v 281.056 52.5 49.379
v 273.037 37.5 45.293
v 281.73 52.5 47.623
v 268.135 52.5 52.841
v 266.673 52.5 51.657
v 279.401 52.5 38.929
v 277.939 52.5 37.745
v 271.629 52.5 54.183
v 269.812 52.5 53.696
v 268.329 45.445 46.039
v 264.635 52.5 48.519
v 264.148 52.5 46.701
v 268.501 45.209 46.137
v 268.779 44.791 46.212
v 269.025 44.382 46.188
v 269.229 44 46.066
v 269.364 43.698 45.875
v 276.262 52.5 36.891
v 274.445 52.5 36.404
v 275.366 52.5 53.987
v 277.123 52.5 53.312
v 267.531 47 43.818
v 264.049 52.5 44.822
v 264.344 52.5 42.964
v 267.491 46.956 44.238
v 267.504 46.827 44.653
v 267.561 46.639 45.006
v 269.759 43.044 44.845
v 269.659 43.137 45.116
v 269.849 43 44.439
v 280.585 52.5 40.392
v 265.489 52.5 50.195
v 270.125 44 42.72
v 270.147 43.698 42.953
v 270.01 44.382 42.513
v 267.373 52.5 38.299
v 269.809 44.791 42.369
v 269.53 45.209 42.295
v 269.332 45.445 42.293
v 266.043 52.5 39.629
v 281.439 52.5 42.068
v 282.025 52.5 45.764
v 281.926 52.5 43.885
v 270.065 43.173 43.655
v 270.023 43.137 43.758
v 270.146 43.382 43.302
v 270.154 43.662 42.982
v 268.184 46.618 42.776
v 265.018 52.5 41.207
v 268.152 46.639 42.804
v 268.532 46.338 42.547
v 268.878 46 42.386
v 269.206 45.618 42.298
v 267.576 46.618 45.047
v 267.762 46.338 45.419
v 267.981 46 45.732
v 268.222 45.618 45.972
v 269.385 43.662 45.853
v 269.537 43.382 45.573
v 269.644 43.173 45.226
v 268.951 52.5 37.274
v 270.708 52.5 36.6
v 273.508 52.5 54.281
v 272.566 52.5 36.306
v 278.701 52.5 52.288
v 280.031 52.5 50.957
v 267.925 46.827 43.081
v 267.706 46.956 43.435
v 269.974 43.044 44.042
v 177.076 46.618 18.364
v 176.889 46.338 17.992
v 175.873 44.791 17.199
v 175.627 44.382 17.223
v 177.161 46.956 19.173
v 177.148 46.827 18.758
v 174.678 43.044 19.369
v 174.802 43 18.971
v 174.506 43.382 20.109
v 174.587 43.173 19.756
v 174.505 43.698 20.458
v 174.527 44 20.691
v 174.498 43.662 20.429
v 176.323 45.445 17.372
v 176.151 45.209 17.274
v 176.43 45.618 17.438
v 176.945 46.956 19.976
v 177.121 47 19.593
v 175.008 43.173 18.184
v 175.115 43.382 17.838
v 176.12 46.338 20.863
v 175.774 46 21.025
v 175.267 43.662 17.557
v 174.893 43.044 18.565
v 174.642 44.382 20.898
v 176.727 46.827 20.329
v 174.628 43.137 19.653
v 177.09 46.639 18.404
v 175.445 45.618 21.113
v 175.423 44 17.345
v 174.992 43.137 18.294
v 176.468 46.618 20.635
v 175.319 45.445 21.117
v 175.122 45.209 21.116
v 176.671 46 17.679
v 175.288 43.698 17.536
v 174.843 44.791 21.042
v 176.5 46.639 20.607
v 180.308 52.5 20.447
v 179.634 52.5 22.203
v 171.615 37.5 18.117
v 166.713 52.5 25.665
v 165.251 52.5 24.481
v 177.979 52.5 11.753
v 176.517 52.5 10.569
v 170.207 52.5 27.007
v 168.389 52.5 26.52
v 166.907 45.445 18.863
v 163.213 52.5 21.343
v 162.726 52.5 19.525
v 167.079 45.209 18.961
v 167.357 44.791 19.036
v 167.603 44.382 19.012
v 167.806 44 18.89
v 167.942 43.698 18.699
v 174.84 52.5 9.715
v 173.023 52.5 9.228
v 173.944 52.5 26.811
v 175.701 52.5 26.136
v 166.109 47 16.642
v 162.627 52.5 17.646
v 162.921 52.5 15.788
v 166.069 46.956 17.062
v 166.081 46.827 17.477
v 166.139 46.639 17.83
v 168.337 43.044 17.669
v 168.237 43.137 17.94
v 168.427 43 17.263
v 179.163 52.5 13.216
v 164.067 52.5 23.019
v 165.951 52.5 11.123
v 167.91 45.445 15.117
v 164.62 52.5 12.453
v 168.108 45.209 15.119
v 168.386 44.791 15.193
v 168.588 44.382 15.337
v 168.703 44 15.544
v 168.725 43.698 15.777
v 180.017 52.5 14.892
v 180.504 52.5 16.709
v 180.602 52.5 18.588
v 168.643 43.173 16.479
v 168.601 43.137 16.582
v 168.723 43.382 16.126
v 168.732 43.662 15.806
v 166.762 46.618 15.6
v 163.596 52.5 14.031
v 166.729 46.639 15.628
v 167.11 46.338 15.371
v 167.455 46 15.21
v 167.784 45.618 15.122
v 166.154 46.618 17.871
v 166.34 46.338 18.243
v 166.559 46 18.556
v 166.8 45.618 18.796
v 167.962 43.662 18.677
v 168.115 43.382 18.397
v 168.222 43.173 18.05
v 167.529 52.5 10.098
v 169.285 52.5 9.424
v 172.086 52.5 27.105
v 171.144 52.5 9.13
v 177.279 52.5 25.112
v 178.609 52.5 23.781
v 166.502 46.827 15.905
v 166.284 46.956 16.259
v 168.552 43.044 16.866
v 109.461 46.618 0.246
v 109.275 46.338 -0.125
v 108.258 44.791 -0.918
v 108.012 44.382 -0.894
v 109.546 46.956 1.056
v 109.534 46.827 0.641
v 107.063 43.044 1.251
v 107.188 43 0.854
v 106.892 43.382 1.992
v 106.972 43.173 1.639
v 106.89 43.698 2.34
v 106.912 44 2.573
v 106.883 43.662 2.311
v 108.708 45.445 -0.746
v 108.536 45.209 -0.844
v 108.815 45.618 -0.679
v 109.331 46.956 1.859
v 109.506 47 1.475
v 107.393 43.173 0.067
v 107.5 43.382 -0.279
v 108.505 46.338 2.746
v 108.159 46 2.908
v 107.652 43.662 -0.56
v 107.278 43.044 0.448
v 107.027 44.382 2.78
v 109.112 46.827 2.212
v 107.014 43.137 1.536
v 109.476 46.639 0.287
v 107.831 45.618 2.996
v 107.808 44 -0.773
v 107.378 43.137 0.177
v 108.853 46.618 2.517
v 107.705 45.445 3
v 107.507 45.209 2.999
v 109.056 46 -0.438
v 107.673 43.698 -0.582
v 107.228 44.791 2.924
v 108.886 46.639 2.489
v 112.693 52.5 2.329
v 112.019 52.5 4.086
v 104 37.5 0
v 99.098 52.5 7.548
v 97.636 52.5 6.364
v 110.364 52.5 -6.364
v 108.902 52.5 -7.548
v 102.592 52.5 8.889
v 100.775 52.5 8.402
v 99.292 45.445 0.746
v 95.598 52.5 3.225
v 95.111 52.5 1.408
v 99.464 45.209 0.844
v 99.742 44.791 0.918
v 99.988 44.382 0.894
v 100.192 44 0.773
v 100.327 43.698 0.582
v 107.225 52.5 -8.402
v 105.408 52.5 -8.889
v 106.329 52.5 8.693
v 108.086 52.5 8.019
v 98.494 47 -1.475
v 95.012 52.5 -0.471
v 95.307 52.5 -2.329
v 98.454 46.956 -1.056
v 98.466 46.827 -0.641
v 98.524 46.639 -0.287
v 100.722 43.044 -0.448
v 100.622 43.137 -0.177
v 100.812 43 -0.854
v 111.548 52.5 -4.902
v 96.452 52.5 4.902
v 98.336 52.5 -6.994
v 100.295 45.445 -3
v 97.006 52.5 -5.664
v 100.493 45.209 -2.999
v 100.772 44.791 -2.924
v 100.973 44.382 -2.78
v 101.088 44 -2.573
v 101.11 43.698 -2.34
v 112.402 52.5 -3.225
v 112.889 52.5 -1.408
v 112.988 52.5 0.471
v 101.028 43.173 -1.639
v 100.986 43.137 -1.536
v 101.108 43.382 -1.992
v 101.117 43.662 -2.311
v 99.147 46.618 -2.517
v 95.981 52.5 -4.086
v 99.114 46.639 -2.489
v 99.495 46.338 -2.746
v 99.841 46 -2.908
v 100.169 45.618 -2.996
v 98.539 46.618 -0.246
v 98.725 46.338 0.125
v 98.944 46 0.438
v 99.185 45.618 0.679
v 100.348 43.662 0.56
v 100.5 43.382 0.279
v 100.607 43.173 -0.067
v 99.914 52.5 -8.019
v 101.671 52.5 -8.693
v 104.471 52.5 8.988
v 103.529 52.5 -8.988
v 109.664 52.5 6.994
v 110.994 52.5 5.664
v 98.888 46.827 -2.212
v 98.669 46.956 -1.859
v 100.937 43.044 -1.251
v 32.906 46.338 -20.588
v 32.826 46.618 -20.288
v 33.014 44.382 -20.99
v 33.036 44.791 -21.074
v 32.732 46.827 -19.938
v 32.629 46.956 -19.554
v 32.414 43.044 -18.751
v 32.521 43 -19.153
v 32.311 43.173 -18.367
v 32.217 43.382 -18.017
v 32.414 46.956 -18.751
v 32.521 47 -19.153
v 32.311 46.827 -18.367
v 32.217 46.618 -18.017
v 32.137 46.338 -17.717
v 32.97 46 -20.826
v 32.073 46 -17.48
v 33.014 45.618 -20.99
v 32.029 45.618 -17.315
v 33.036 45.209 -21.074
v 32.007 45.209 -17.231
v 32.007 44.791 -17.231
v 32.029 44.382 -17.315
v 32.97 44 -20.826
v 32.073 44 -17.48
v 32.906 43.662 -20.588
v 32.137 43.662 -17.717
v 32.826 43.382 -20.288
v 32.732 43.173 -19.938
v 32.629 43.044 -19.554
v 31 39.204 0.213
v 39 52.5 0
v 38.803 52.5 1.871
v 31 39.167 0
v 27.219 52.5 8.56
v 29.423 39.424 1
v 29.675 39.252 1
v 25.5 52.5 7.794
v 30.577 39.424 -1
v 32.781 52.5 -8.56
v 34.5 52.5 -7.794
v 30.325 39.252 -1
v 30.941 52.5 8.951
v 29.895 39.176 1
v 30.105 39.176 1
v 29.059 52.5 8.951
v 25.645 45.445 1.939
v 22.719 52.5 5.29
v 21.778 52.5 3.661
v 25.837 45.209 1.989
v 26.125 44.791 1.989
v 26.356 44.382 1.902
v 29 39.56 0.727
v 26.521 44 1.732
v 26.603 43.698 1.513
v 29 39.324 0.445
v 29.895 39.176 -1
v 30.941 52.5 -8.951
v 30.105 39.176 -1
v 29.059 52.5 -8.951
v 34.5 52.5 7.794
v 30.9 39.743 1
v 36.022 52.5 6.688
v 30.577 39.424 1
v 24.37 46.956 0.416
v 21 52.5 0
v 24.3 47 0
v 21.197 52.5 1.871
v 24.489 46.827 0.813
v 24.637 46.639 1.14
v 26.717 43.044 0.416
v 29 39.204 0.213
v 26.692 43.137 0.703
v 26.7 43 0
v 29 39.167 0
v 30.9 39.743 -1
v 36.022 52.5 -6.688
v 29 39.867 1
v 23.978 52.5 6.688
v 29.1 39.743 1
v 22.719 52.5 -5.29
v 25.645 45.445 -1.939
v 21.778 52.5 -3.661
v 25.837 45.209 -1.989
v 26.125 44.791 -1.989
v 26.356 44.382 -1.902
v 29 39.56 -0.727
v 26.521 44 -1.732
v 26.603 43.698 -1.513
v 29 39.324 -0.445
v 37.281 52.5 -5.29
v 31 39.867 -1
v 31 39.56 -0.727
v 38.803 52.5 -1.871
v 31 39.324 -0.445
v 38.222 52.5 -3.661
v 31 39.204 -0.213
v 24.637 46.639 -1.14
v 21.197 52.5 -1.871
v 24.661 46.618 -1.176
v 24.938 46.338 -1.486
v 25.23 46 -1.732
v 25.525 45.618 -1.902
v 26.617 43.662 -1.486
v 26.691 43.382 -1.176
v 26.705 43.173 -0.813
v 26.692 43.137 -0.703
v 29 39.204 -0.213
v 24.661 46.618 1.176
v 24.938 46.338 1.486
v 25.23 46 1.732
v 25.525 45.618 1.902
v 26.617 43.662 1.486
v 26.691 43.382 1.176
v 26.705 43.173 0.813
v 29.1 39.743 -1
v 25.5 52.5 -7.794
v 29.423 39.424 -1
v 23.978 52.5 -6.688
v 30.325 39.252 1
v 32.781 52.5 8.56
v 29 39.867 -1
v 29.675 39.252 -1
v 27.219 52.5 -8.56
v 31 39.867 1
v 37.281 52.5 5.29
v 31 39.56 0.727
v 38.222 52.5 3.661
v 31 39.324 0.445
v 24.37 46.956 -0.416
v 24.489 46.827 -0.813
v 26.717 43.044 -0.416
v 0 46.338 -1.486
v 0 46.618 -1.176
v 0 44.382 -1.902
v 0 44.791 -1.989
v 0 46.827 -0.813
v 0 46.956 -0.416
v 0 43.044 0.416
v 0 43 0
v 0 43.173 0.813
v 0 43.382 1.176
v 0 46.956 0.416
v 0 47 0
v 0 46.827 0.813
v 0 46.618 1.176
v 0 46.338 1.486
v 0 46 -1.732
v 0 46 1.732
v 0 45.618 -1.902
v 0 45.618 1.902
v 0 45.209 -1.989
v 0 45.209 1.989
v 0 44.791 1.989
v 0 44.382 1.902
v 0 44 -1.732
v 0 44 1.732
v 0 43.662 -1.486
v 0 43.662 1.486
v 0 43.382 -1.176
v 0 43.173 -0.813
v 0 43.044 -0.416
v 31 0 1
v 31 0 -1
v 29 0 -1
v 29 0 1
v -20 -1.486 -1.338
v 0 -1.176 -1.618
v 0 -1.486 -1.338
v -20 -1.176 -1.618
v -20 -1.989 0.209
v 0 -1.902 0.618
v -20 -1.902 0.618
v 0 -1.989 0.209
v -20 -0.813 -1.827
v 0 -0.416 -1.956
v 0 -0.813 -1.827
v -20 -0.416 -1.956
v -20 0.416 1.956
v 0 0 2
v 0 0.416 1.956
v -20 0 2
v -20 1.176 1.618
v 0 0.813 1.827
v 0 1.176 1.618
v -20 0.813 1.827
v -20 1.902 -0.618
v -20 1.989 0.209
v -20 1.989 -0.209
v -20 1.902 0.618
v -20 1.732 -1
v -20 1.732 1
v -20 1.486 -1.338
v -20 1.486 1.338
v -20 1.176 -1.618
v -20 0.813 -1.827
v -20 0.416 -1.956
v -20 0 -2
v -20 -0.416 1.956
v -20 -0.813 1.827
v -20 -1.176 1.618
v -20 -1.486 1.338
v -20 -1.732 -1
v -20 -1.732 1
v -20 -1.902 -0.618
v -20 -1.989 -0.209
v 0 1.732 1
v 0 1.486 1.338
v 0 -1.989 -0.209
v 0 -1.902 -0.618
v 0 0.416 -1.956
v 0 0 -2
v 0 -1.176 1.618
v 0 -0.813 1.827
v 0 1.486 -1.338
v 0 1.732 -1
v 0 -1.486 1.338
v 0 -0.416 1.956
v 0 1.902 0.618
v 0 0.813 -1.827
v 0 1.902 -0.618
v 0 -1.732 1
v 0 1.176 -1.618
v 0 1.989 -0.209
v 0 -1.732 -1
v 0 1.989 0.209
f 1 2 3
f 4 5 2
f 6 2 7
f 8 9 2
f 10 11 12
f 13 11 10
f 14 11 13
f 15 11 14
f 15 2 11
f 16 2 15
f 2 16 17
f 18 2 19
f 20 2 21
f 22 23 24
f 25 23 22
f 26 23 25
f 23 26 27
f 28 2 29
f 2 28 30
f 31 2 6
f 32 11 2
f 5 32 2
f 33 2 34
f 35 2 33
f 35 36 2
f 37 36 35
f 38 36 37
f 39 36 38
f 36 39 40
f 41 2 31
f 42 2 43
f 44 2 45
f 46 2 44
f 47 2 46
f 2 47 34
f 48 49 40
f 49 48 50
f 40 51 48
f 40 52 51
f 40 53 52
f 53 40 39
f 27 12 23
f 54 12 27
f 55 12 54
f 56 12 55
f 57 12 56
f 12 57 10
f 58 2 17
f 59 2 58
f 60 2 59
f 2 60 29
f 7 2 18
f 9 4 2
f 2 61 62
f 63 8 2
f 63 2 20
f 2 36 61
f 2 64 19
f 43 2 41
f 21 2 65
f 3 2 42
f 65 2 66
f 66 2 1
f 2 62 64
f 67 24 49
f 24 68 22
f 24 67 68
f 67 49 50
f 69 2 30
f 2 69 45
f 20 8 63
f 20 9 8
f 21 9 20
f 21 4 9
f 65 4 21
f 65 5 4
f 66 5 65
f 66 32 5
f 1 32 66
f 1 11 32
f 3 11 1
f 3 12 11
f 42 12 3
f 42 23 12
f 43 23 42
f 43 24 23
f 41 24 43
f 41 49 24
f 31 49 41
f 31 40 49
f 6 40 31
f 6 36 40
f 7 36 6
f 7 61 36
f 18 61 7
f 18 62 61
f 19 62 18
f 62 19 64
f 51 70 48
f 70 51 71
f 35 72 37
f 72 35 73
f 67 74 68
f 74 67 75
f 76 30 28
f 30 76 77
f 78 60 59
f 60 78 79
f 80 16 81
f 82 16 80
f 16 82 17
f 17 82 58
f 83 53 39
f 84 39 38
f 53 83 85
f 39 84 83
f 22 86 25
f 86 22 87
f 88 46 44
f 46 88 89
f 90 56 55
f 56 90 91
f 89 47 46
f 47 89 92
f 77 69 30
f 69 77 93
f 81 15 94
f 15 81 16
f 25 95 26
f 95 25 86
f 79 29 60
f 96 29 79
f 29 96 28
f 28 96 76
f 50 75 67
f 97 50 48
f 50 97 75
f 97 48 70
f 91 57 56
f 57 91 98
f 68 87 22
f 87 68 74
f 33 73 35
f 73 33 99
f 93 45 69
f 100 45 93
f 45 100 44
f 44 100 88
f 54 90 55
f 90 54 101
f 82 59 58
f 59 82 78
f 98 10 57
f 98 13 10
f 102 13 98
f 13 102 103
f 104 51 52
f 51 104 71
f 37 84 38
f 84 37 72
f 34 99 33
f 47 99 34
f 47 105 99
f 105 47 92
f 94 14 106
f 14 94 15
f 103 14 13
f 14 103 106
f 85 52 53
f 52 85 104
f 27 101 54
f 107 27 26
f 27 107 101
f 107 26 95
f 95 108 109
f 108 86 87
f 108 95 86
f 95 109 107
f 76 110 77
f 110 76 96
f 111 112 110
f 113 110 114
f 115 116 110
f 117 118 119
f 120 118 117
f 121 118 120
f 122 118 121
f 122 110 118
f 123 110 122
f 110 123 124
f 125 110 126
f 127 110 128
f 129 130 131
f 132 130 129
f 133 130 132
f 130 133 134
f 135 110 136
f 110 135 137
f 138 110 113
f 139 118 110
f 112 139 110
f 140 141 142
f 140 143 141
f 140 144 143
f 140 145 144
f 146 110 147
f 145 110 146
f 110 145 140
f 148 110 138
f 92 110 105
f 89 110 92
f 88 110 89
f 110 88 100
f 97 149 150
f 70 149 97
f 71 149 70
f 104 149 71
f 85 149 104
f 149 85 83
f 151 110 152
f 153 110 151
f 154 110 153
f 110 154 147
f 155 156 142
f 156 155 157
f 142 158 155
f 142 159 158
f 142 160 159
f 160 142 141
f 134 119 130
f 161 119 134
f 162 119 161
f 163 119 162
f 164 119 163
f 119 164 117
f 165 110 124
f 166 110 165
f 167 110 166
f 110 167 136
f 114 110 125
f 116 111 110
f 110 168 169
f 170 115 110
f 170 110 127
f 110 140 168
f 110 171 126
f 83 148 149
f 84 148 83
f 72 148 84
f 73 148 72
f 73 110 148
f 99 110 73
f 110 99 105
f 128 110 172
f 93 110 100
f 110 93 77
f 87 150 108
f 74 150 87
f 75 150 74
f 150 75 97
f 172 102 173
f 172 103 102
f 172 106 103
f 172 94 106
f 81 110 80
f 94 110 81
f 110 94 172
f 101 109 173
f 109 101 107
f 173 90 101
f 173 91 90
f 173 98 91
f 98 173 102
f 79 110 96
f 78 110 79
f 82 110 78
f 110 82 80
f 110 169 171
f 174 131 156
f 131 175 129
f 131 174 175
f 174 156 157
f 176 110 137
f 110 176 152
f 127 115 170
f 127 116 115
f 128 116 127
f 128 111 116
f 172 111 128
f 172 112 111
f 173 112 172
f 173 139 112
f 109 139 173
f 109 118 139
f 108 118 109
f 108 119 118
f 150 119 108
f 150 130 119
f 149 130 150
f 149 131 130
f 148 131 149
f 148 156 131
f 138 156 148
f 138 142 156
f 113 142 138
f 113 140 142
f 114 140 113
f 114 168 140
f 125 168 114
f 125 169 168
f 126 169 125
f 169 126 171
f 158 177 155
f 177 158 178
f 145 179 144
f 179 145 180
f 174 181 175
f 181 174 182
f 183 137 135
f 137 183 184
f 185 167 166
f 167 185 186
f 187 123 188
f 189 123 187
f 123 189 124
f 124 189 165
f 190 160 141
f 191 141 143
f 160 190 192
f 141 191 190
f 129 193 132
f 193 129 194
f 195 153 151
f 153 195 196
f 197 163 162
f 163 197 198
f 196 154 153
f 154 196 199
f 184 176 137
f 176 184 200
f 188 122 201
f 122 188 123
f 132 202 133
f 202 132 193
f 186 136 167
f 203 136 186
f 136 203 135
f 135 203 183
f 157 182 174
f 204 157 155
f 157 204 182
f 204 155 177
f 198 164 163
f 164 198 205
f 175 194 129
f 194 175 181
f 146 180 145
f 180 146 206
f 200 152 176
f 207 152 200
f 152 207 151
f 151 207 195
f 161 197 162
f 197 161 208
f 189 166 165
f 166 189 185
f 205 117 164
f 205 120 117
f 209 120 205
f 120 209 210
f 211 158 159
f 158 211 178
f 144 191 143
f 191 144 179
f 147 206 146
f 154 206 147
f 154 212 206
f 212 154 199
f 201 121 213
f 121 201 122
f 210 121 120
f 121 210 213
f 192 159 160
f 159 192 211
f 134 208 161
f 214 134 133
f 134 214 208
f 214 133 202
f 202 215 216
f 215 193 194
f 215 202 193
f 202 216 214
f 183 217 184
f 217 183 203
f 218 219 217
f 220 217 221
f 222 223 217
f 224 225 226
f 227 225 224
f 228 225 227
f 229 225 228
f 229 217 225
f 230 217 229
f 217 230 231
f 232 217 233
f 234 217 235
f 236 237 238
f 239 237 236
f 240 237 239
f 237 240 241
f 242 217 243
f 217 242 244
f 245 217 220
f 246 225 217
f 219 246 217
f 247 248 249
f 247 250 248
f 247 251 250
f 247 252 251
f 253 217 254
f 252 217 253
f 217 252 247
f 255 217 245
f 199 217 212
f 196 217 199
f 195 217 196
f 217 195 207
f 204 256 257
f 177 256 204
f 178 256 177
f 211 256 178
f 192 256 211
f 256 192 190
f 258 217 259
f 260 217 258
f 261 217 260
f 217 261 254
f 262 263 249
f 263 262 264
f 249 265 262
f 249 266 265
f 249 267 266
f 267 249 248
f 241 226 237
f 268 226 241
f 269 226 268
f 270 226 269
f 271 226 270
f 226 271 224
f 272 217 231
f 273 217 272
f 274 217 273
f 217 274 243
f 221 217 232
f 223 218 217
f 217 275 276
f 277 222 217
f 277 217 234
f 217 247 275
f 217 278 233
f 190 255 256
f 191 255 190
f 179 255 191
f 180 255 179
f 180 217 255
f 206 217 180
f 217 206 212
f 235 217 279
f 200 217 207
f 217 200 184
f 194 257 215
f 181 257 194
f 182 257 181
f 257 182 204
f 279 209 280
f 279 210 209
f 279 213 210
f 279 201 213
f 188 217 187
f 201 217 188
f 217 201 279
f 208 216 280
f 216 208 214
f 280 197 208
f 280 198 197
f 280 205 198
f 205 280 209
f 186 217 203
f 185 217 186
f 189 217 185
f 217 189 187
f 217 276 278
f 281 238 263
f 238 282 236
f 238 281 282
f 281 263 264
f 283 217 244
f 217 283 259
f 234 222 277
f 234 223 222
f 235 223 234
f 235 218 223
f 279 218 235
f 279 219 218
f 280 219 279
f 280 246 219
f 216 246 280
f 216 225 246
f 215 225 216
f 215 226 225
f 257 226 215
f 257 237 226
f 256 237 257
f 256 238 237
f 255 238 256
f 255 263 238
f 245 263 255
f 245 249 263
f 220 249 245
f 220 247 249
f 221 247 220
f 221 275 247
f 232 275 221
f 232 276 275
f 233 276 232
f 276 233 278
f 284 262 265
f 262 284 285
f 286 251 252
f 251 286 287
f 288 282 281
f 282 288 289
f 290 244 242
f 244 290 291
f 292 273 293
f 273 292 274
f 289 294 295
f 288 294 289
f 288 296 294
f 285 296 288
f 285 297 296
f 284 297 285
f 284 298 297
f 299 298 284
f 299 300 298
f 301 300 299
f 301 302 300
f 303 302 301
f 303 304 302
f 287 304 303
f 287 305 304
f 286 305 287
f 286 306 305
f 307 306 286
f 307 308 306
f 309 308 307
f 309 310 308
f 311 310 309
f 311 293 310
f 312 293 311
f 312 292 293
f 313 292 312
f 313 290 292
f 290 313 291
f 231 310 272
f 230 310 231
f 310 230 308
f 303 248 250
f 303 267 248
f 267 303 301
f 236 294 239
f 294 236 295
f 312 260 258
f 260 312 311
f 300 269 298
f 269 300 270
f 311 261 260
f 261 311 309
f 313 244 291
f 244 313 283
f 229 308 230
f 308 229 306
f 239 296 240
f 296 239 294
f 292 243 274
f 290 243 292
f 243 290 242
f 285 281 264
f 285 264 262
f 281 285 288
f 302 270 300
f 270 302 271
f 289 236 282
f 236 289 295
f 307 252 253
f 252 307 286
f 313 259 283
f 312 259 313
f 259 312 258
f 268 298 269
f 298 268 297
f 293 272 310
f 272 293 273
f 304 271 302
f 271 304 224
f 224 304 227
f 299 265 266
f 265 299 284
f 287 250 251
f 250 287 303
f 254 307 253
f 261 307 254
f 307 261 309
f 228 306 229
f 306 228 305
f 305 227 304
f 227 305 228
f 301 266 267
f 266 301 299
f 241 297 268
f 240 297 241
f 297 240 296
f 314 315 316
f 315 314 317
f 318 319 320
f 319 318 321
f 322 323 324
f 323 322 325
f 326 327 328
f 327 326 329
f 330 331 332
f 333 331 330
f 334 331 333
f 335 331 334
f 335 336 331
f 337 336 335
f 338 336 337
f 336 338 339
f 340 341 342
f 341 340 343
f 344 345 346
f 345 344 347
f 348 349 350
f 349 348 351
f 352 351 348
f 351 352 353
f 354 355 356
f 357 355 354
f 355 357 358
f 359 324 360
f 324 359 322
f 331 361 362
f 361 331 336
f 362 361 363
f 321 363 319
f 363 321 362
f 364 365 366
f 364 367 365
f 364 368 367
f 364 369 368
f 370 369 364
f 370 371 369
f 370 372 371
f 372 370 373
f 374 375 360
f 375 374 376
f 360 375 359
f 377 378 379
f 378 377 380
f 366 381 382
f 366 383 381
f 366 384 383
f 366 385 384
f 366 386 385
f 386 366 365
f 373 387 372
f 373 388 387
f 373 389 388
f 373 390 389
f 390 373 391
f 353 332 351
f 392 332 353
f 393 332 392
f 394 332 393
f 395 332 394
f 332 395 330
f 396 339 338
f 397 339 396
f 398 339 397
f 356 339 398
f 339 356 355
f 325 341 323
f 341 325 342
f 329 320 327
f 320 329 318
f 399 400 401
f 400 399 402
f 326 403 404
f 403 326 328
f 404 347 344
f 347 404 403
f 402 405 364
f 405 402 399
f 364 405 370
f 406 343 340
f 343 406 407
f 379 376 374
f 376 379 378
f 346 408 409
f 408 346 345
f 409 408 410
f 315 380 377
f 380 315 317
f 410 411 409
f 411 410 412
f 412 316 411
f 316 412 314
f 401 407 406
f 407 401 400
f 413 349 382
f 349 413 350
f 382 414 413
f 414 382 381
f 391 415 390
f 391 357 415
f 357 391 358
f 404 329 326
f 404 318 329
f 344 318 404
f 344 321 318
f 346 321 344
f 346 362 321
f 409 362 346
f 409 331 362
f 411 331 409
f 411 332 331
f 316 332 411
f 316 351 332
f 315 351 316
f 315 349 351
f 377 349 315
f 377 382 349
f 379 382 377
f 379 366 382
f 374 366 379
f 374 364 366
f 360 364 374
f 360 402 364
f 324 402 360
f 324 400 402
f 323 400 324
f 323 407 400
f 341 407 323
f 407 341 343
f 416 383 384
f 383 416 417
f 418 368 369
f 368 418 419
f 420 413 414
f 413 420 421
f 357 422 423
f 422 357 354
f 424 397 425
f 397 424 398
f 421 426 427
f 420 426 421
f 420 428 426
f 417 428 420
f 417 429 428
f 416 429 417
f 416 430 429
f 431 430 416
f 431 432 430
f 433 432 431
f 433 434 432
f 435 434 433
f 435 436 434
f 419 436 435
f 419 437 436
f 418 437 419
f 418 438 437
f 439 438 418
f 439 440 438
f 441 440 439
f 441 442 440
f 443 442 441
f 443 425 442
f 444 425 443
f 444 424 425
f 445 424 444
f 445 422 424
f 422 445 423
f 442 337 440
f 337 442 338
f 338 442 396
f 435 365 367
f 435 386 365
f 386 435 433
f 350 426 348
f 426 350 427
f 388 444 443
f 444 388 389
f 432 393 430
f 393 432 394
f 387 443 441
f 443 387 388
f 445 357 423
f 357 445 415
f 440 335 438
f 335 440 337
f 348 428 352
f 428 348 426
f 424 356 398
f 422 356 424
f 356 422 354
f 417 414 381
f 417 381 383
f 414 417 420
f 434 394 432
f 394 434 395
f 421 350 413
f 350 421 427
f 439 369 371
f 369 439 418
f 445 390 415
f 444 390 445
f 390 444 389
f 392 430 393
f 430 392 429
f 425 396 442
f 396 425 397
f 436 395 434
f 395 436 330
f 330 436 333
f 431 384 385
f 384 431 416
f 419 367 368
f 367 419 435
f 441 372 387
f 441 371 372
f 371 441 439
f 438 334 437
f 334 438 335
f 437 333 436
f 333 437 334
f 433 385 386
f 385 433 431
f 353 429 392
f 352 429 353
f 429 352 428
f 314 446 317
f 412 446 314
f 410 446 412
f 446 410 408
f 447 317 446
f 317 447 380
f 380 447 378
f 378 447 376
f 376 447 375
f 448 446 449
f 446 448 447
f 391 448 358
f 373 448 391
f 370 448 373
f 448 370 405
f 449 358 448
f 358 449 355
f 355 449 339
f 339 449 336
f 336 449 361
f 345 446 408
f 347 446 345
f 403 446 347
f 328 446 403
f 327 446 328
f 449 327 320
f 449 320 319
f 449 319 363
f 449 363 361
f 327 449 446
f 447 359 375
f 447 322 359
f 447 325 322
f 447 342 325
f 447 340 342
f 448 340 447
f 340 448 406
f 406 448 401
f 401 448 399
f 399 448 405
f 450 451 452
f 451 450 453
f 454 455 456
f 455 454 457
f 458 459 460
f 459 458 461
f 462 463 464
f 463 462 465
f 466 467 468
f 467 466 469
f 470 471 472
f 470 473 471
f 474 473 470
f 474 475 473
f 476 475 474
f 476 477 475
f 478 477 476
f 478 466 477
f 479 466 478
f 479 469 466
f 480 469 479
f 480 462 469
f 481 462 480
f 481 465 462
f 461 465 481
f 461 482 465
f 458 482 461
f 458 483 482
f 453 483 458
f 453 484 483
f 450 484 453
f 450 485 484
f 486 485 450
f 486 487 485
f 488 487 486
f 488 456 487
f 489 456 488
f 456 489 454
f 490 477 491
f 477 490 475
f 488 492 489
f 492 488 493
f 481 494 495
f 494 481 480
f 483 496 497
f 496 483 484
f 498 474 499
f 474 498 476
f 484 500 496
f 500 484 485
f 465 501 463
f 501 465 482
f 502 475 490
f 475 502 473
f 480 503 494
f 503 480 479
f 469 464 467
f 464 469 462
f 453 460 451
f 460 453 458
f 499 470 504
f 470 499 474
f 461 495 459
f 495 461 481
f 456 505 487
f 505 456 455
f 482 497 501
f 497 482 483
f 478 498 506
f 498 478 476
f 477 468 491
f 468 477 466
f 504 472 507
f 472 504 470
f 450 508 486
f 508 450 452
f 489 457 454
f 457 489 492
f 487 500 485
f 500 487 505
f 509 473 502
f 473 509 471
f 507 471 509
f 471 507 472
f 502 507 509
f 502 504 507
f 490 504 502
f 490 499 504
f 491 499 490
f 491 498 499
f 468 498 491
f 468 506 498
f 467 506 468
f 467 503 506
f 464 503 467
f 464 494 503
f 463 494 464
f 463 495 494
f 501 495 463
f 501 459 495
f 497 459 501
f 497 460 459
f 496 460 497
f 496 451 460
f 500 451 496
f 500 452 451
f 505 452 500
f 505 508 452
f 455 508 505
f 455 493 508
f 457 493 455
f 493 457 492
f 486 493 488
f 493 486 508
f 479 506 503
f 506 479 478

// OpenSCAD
resolution = 30;

jr = 9;
jh = 15;
ow = 2;

alpha1 = 90;
a1     = 30;
theta1 = 0;
d1     = -45;

alpha2 = 0;
a2     = 74;
theta2 = 15;
d2     = 0;

alpha3 = 0;
a3     = 70;
theta3 = 0;
d3     = 0;

alpha4 = 0;
a4     = 105;
theta4 = 0;
d4     = 0;

        k = -20;
        rotate ([0, 90 * (k / abs(k)), 0]) cylinder (r = 2, h = abs(k), $fn = resolution); // link
dh_cone(alpha1, a1, theta1, d1);

module dh_cone(alpha=0, a=0, theta=0, d=0) {
    rotate([alpha, 0, 0])
    translate([a, 0, 0])
    rotate([0, 0, theta])
    translate([0, 0, d]) {
        color([231/255, 88/255, 88/255]) cylinder(r1=jr, r2=0, h=jh, center=true, $fn=resolution); // joint
        rotate ([0, -90, 0]) cylinder (r = 2, h = a, $fn = resolution); // link
        color ([70/255, 70/255, 70/255]) translate([0, 0, -d/2]) cube ([ow, ow, abs(d)], center=true); // offset

        dh_cone2(alpha2, a2, theta2, d2);
    }
}
module dh_cone2(alpha=0, a=0, theta=0, d=0) {
    rotate([alpha, 0, 0])
    translate([a, 0, 0])
    rotate([0, 0, theta])
    translate([0, 0, d]) {
        color([231/255, 88/255, 88/255]) cylinder(r1=jr, r2=0, h=jh, center=true, $fn=resolution); // joint
        rotate ([0, -90, 0]) cylinder (r = 2, h = a, $fn = resolution); // link
        color ([70/255, 70/255, 70/255]) translate([0, 0, -d/2]) cube ([ow, ow, abs(d)], center=true); // offset

        dh_cone3(alpha3, a3, theta3, d3);
    }
}
module dh_cone3(alpha=0, a=0, theta=0, d=0) {
    rotate([alpha, 0, 0])
    translate([a, 0, 0])
    rotate([0, 0, theta])
    translate([0, 0, d]) {
        color([231/255, 88/255, 88/255]) cylinder(r1=jr, r2=0, h=jh, center=true, $fn=resolution); // joint
        rotate ([0, -90, 0]) cylinder (r = 2, h = a, $fn = resolution); // link
        color ([70/255, 70/255, 70/255]) translate([0, 0, -d/2]) cube ([ow, ow, abs(d)], center=true); // offset

        dh_cone4(alpha4, a4, theta4, d4);
    }
}
module dh_cone4(alpha=0, a=0, theta=0, d=0) {
    rotate([alpha, 0, 0])
    translate([a, 0, 0])
    rotate([0, 0, theta])
    translate([0, 0, d]) {
        color([231/255, 88/255, 88/255]) cylinder(r1=jr, r2=0, h=jh, center=true, $fn=resolution); // joint
        rotate ([0, -90, 0]) cylinder (r = 2, h = a, $fn = resolution); // link
        color ([70/255, 70/255, 70/255]) translate([0, 0, -d/2]) cube ([ow, ow, abs(d)], center=true); // offset
    }
}
